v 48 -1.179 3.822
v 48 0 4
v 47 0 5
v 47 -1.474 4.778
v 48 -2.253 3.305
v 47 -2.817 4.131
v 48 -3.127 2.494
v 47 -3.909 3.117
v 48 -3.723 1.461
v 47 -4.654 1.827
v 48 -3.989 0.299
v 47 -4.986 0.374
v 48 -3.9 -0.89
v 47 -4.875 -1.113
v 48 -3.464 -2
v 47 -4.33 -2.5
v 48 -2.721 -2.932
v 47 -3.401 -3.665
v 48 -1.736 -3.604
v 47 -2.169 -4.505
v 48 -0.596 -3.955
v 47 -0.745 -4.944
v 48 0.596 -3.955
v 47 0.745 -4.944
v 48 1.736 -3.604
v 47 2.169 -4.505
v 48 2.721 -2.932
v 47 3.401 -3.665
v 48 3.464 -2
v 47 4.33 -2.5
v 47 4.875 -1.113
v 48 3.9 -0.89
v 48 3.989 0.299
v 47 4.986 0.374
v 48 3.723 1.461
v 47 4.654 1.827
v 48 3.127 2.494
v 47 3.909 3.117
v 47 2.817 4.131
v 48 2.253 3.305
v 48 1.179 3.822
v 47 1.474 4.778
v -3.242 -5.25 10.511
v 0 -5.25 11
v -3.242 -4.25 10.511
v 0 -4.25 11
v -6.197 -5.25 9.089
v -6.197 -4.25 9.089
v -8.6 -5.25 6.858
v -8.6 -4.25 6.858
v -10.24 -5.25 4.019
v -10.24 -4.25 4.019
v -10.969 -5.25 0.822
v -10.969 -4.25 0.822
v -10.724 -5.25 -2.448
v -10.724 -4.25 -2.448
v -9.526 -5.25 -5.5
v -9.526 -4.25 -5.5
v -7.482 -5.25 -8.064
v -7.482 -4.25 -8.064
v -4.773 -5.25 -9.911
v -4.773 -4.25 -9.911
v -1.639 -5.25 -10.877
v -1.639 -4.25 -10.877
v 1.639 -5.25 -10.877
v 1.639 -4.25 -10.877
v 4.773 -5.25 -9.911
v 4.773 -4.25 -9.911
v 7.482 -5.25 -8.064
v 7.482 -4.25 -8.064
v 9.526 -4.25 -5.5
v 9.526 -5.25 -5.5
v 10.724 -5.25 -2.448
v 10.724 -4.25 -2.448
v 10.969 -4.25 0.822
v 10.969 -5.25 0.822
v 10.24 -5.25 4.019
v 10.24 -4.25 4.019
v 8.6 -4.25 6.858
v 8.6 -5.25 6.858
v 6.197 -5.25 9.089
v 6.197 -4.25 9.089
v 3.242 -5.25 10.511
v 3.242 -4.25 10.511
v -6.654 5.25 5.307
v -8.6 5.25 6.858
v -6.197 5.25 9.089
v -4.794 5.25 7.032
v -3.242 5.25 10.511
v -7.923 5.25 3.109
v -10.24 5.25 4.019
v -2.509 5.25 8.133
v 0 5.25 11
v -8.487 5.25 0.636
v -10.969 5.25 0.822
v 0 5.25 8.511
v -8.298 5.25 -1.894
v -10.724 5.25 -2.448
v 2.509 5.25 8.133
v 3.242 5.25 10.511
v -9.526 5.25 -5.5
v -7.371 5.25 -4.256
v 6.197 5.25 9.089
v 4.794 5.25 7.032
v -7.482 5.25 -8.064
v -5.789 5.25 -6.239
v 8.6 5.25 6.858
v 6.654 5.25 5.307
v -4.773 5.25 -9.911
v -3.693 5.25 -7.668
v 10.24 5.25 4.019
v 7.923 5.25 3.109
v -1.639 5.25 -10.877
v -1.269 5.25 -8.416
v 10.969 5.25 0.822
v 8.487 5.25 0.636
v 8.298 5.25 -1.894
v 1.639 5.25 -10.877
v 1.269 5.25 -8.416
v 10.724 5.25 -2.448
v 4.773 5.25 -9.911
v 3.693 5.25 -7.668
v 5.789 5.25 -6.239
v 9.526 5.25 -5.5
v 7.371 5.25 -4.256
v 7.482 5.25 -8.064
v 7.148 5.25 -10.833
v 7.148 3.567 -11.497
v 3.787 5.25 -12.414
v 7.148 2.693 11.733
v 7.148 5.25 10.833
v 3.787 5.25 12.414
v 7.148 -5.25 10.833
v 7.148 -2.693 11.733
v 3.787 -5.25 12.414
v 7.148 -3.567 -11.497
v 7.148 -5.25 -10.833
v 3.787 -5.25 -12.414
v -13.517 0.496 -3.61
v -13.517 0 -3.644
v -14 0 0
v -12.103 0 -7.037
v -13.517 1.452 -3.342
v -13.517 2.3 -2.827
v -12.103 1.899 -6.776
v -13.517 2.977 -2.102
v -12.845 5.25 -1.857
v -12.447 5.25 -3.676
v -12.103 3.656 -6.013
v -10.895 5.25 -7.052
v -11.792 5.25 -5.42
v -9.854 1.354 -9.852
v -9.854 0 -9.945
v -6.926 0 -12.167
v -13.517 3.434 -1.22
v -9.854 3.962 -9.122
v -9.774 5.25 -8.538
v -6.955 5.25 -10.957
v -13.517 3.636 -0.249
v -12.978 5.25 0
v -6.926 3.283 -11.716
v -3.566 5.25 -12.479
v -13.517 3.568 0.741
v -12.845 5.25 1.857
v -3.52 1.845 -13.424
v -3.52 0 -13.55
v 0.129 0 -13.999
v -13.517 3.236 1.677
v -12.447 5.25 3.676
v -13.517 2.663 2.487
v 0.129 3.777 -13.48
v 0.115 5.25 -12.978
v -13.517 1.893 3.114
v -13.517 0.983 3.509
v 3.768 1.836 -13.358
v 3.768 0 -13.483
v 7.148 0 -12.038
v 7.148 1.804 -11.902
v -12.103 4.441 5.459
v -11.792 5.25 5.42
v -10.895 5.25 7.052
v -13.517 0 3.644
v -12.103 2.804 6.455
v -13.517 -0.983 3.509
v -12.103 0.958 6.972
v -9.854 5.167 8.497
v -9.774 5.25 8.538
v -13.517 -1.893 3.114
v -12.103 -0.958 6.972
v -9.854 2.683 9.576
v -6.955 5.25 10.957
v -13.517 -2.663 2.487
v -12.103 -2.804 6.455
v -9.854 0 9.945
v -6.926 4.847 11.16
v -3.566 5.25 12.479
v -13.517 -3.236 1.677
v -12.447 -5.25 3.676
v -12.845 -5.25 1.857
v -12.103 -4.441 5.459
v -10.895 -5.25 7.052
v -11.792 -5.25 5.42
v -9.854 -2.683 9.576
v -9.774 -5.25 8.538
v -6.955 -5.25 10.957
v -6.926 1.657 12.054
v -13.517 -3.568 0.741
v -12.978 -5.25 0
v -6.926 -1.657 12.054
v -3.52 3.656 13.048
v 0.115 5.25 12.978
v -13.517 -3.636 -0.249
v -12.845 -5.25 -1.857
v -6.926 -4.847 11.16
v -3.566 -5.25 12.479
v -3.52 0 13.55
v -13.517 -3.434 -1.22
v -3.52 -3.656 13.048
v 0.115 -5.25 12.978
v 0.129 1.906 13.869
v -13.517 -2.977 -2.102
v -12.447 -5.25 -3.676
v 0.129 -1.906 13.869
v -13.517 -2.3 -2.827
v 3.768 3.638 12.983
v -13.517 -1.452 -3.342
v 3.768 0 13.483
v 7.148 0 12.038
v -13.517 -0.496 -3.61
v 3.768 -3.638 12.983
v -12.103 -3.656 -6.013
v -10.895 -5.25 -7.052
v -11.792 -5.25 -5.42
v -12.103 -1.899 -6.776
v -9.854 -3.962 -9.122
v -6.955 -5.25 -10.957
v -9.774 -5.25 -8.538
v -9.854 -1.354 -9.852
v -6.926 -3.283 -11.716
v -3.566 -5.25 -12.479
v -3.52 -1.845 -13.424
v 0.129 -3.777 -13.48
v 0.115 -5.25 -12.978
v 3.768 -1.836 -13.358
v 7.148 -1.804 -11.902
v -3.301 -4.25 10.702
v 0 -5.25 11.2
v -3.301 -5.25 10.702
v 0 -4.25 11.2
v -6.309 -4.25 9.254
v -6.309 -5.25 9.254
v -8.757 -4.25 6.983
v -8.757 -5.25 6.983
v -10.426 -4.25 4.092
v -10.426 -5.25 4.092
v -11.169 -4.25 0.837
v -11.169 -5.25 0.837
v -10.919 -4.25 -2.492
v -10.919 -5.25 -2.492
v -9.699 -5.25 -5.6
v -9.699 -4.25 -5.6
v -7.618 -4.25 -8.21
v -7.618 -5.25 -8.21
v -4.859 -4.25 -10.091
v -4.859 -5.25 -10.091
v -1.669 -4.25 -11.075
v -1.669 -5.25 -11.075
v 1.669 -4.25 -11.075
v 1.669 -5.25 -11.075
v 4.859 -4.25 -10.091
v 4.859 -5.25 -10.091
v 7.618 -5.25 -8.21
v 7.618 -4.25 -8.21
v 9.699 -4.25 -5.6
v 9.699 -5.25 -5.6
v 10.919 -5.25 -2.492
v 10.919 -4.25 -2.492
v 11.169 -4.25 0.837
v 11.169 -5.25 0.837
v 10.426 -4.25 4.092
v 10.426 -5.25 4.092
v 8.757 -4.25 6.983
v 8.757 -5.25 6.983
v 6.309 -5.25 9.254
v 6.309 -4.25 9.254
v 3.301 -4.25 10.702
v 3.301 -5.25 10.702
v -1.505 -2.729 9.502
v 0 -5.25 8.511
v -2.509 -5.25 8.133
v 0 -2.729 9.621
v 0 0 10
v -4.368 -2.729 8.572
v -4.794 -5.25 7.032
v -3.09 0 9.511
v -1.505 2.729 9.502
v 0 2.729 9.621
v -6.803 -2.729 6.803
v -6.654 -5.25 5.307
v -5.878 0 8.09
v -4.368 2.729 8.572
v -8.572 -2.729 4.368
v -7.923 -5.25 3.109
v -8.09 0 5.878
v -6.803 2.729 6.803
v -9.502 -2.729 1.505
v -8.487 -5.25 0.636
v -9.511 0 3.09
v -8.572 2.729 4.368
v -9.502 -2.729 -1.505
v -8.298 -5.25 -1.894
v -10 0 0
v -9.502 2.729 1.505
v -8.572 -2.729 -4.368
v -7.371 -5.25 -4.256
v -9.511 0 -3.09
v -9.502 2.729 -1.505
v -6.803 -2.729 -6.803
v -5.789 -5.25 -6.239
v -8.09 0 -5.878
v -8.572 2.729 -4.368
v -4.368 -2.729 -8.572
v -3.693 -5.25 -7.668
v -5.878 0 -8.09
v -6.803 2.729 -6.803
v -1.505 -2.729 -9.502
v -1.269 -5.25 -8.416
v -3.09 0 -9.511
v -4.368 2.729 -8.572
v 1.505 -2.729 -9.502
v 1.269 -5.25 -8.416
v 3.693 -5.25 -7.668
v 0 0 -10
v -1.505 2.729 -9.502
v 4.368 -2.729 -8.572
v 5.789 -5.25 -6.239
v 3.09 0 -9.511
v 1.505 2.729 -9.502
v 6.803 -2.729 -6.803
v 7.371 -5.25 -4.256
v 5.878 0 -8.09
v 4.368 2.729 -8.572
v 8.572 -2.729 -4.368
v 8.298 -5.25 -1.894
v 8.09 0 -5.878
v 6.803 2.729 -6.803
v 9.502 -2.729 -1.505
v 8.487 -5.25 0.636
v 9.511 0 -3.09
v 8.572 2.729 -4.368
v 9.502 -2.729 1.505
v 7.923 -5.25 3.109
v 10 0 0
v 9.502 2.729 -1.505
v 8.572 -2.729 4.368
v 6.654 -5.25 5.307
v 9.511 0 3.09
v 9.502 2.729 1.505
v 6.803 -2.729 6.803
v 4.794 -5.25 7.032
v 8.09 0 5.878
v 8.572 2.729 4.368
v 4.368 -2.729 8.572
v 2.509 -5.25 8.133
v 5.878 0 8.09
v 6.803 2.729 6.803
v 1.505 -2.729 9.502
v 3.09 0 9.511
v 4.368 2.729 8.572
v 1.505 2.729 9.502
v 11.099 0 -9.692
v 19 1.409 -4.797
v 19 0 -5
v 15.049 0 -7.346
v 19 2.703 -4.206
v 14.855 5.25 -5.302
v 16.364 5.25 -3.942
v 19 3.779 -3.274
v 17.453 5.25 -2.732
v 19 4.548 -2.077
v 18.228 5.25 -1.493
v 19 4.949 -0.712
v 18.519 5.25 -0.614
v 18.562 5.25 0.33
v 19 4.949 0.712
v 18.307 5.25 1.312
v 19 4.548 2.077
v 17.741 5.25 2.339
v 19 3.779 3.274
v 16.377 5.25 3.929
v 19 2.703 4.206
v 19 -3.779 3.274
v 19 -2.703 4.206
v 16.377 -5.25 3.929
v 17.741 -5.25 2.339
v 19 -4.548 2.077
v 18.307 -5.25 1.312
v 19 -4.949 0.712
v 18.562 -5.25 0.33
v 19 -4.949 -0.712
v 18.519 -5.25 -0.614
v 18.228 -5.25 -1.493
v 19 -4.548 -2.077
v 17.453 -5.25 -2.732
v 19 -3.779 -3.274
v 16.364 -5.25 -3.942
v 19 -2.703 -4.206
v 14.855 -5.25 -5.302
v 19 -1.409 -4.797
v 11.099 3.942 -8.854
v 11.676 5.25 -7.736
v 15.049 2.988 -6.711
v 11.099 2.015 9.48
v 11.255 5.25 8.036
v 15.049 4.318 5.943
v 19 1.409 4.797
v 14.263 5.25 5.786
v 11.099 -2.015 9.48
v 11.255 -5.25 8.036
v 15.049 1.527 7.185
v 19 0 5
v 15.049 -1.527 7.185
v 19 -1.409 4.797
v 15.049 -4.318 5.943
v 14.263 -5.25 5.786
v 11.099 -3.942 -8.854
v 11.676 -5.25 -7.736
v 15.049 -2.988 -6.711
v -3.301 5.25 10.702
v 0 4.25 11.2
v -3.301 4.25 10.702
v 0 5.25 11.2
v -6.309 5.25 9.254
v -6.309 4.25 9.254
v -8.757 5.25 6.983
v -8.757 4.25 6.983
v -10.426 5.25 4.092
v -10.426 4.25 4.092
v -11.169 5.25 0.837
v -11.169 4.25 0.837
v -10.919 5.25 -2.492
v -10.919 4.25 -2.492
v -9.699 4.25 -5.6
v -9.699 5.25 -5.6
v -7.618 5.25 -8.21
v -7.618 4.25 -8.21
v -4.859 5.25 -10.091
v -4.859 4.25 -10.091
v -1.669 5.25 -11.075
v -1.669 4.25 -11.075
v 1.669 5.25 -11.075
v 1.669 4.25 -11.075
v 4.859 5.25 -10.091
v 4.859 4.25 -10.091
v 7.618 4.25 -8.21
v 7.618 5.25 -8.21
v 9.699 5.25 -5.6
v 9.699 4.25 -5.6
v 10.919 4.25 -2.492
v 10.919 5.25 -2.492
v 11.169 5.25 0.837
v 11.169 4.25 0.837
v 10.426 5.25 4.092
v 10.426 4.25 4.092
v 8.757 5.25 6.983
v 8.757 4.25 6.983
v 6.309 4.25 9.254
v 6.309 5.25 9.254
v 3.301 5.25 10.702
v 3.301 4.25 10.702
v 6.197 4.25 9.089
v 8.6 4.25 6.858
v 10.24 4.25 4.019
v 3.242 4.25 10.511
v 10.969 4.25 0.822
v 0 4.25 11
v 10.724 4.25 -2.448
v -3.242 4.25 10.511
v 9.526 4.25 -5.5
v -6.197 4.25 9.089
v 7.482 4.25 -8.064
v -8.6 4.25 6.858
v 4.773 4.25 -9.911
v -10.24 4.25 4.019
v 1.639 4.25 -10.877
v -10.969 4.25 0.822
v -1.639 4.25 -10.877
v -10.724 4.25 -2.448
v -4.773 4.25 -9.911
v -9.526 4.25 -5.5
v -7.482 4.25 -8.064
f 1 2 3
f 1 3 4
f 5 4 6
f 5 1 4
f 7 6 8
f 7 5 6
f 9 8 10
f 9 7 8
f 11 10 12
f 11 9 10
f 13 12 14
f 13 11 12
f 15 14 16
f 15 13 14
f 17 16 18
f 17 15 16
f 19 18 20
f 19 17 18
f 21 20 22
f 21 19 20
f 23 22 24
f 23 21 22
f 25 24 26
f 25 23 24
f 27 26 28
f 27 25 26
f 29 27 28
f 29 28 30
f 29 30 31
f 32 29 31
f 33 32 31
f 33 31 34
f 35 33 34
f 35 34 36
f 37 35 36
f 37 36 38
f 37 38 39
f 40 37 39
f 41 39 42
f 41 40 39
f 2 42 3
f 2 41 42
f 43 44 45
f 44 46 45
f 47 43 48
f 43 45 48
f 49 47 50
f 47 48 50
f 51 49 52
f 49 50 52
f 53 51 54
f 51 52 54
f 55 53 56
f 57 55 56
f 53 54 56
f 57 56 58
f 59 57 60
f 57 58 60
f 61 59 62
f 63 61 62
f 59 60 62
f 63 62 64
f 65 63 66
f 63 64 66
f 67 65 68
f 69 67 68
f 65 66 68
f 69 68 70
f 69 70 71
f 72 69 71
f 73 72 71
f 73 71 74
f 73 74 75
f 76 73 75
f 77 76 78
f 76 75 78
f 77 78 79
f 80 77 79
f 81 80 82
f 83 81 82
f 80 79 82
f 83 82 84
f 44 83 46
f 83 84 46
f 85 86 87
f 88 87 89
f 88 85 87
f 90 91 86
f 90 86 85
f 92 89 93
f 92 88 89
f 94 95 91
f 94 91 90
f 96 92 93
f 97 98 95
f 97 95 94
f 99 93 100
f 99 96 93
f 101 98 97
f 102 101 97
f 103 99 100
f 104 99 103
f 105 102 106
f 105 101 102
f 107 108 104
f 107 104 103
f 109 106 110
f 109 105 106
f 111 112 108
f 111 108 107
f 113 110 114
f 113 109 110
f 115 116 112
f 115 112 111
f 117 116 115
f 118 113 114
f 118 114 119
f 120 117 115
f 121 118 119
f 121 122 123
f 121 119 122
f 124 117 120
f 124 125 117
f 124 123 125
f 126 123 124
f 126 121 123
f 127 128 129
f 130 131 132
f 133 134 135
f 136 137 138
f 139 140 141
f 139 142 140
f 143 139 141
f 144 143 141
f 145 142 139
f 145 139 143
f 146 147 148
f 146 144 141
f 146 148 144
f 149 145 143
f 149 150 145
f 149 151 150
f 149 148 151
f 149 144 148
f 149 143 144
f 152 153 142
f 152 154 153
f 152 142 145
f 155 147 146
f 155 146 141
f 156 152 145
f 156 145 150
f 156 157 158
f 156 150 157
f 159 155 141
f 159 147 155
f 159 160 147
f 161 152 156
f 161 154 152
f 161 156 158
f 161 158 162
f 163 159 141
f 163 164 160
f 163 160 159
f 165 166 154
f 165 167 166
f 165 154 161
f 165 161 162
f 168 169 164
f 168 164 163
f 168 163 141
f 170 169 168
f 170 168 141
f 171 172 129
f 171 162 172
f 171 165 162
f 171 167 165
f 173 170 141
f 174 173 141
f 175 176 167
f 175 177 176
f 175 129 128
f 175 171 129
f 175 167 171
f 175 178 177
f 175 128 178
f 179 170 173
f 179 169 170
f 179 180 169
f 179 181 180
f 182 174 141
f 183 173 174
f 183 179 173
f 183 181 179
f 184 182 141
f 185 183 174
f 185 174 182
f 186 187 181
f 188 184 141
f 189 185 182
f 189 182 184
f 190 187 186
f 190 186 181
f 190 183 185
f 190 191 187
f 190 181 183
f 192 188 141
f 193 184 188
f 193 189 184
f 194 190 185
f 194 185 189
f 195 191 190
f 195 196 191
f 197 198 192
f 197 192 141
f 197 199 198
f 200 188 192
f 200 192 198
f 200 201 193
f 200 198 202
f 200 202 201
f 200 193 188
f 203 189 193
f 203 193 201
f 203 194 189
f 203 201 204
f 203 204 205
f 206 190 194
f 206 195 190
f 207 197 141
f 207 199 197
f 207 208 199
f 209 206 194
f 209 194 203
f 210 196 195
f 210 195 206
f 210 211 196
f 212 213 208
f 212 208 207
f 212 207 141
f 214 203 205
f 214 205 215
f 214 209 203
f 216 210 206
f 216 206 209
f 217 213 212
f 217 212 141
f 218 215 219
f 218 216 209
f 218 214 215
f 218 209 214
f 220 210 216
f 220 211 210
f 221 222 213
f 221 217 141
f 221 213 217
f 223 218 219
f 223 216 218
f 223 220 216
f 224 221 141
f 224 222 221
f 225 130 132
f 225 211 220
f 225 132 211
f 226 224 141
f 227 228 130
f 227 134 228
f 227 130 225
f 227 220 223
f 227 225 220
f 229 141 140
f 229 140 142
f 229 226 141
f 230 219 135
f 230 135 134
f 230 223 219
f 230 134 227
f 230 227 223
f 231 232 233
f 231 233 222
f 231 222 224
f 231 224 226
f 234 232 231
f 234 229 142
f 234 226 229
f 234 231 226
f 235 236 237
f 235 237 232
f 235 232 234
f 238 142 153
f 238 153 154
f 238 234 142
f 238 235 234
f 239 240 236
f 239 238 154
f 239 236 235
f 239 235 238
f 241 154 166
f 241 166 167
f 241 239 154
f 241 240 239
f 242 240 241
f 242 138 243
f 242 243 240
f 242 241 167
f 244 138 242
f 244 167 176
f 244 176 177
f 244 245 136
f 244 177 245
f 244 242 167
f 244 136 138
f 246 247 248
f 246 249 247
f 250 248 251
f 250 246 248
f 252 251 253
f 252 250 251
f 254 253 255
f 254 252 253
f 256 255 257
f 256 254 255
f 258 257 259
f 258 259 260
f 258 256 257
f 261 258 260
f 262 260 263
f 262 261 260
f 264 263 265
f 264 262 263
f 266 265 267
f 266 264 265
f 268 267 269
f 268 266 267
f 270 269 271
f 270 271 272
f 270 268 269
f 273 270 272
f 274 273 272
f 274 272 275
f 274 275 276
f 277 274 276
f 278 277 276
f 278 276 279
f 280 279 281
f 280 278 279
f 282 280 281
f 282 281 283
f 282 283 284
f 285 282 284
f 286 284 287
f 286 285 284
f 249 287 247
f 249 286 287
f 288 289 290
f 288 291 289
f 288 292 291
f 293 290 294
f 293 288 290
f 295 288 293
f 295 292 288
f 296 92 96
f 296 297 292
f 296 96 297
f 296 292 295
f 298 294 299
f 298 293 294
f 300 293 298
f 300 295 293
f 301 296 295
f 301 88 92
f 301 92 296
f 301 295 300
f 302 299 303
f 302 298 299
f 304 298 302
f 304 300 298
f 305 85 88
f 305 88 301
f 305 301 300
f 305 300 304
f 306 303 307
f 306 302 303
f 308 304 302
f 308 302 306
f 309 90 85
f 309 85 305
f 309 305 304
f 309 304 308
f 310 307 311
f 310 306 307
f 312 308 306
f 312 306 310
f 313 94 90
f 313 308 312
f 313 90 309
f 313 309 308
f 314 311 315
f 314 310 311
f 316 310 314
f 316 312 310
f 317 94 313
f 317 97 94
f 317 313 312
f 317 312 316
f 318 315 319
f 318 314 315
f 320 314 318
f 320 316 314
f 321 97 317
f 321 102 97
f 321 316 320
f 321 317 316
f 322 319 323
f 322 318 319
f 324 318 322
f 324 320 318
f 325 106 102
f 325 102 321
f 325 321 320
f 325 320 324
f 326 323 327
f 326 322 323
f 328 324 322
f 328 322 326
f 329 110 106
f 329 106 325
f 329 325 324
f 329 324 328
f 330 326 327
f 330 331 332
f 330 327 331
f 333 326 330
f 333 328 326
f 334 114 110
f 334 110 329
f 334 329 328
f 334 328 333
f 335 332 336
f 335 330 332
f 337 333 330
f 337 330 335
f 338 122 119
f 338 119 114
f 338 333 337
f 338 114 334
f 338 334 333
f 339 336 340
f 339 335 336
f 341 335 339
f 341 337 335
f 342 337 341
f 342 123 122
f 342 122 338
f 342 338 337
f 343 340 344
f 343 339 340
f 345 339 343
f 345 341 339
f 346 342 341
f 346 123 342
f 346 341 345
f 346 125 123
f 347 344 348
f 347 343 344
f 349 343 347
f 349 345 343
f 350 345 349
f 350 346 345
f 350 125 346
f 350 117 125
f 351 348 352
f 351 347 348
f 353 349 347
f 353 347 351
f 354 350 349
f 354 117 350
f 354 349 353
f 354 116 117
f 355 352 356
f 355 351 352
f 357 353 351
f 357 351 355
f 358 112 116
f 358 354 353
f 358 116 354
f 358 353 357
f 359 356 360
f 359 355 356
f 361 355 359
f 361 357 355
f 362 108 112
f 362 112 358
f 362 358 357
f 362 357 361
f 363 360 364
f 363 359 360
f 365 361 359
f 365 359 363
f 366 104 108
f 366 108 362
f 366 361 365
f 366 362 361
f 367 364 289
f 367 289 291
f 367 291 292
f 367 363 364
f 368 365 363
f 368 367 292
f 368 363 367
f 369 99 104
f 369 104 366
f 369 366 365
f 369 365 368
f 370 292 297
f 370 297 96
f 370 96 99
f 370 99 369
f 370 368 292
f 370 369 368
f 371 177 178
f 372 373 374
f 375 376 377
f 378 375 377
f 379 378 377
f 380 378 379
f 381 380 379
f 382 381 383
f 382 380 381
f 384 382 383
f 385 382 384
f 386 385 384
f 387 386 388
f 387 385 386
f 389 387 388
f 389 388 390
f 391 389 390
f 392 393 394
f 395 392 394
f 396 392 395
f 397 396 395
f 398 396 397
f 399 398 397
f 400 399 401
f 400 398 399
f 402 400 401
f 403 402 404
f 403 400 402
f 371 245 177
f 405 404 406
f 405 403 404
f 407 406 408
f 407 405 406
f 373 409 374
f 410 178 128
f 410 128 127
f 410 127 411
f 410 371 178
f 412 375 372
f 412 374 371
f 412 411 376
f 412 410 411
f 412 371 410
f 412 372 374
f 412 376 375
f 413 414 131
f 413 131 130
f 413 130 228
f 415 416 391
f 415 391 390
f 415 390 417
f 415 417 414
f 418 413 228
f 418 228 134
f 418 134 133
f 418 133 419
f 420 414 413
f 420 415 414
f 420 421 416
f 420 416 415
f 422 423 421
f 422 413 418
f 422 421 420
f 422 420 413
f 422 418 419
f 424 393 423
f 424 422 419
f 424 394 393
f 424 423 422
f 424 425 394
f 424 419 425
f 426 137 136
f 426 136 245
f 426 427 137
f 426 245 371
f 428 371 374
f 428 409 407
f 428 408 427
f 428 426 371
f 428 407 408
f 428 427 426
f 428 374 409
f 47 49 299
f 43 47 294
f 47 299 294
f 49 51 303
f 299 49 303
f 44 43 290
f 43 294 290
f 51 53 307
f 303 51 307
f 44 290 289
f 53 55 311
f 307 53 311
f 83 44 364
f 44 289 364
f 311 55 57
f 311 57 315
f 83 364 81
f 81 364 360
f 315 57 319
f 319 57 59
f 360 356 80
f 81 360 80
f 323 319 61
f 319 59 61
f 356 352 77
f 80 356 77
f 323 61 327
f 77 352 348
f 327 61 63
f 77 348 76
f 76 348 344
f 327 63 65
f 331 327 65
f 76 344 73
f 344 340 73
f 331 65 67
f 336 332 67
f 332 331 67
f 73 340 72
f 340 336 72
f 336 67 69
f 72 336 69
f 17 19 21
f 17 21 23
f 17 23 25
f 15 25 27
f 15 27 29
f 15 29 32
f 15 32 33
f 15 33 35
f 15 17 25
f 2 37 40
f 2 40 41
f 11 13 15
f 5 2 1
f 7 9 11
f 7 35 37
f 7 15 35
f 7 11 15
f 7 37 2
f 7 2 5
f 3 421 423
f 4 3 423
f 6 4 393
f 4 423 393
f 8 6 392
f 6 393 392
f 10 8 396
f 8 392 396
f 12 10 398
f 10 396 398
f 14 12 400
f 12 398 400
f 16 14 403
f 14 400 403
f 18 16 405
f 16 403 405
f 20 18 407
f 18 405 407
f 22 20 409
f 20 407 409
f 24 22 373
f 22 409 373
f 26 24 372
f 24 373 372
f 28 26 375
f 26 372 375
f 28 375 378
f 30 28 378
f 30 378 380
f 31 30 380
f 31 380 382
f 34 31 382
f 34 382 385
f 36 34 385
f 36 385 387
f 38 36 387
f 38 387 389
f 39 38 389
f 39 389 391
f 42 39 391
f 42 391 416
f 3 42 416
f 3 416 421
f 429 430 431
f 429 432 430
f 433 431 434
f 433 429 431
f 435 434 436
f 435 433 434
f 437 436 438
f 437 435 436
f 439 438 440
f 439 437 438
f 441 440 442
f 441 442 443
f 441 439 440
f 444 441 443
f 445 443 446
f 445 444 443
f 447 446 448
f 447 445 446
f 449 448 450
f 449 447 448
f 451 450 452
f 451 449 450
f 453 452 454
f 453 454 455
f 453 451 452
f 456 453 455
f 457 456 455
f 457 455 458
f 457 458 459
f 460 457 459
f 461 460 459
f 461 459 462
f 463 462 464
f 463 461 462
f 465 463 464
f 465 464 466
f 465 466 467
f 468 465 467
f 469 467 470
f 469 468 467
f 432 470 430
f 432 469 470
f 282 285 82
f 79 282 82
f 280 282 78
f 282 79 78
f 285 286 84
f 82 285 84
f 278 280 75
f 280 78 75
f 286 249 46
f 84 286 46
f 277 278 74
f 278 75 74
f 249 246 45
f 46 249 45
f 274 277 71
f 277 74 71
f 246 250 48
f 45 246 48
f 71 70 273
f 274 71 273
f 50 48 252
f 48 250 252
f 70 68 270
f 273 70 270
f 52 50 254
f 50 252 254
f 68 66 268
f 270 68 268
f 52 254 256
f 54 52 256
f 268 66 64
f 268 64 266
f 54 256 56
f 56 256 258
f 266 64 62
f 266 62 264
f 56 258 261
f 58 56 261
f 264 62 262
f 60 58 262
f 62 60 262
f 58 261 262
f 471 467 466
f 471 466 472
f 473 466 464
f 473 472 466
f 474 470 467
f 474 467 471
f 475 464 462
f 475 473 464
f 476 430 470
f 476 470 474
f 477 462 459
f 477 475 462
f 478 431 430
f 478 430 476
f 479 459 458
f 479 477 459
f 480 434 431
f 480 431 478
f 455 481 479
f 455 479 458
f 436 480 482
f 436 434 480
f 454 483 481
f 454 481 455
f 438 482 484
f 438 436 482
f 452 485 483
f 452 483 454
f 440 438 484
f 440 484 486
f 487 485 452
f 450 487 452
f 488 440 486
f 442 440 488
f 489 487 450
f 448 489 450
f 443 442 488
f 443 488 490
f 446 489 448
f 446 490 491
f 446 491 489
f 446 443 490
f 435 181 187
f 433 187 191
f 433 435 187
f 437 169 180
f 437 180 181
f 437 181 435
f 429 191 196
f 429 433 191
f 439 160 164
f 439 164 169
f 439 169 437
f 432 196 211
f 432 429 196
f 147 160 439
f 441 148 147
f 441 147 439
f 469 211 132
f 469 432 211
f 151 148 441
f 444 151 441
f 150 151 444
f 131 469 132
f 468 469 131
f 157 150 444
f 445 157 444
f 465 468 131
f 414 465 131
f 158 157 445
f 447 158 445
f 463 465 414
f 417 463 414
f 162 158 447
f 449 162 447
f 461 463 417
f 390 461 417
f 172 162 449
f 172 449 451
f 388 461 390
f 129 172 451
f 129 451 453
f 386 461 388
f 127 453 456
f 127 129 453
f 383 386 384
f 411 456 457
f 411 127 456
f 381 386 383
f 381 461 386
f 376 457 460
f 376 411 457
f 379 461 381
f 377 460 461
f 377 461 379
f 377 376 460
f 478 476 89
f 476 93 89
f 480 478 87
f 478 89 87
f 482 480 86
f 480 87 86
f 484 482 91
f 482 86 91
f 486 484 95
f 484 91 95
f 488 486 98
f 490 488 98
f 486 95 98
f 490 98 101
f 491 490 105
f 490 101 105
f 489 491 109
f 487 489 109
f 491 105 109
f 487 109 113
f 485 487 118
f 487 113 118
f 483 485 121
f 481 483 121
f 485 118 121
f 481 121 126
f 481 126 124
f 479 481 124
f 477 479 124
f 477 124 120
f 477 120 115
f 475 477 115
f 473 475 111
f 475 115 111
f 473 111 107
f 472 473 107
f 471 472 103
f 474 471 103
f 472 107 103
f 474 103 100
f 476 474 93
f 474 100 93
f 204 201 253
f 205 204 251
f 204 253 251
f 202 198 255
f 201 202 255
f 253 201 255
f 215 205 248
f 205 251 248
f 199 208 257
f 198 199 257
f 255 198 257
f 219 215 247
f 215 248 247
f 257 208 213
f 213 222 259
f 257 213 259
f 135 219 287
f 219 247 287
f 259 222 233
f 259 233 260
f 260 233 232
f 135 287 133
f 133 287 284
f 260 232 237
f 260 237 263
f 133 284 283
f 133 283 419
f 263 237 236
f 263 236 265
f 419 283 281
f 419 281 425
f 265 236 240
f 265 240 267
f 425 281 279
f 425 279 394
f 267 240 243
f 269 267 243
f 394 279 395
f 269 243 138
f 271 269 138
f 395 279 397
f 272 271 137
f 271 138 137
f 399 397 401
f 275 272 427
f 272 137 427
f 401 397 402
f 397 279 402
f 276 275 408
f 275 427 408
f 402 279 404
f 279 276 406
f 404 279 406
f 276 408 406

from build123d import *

# Parameters (mm, degrees)
CUT_EXTRUDE1_DEPTH      = 28.440845468
CUT_EXTRUDE1_DEPTH_BACK = 28.440845468
SKETCH3_W               = 33
SKETCH3_H               = 8.75
SKETCH4_W               = 0.2
SKETCH4_H               = 1
SKETCH5_R               = 5
BOSS_EXTRUDE1_DEPTH     = 29
CHAMFER1_SIZE           = 1


with BuildPart() as part:
    # Sketch2 → Revolve2 (revolve)
    with BuildSketch(Plane(origin=(0, 0, 0), x_dir=(1, 0, 0), z_dir=(0, 1, 0))):
        with BuildLine():
            Line((7.147970434, 12.037712352), (19, 5))
            Line((19, 5), (19, 0))
            Line((19, 0), (-14, 0))
            ThreePointArc((-14, 0), (-6.925619609, 12.166996056), (7.147970434, 12.037712352))
        make_face()
    revolve(axis=Axis((-39.456415939, 0, 0), (1, 0, 0)))

    # Sketch3 → Cut-Extrude1 (cut, two sides: drawn at the far end of the back side and taken through both)
    with BuildSketch(Plane.XY.offset(-CUT_EXTRUDE1_DEPTH_BACK)):
        with Locations((2.5, 9.625)):
            Rectangle(SKETCH3_W, SKETCH3_H)
        with Locations((2.5, -9.625)):
            Rectangle(SKETCH3_W, SKETCH3_H)
    extrude(amount=CUT_EXTRUDE1_DEPTH + CUT_EXTRUDE1_DEPTH_BACK, mode=Mode.SUBTRACT)

    # Sketch4 → Cut-Revolve1 (revolve, cut)
    with BuildSketch(Plane.XY, mode=Mode.PRIVATE) as cut_revolve1_sk:
        with BuildLine():
            Line((0, 10), (0, -10))
            ThreePointArc((0, -10), (10, 0), (0, 10))
        make_face()
        with Locations((11.1, 4.75)):
            Rectangle(SKETCH4_W, SKETCH4_H)
        with Locations((11.1, -4.75)):
            Rectangle(SKETCH4_W, SKETCH4_H)
    revolve(cut_revolve1_sk.sketch.rotate(Axis((0, 13.975998128, 0), (0, -1, 0)), 90), axis=Axis((0, 13.975998128, 0), (0, -1, 0)), mode=Mode.SUBTRACT)

    # Sketch5 → Boss-Extrude1 (add)
    with BuildSketch(Plane(origin=(19, 0, 0), x_dir=(0, 0, -1), z_dir=(1, 0, 0))):
        with Locations(Location((0, 0, 0), (0, 0, 180))):
            Circle(SKETCH5_R)
    extrude(amount=BOSS_EXTRUDE1_DEPTH)

    # Chamfer1
    chamfer1_edges = [part.edges().sort_by_distance(p)[0] for p in [
        (48, 0, -5),
    ]]
    chamfer(chamfer1_edges, length=CHAMFER1_SIZE)


solid = part.part
